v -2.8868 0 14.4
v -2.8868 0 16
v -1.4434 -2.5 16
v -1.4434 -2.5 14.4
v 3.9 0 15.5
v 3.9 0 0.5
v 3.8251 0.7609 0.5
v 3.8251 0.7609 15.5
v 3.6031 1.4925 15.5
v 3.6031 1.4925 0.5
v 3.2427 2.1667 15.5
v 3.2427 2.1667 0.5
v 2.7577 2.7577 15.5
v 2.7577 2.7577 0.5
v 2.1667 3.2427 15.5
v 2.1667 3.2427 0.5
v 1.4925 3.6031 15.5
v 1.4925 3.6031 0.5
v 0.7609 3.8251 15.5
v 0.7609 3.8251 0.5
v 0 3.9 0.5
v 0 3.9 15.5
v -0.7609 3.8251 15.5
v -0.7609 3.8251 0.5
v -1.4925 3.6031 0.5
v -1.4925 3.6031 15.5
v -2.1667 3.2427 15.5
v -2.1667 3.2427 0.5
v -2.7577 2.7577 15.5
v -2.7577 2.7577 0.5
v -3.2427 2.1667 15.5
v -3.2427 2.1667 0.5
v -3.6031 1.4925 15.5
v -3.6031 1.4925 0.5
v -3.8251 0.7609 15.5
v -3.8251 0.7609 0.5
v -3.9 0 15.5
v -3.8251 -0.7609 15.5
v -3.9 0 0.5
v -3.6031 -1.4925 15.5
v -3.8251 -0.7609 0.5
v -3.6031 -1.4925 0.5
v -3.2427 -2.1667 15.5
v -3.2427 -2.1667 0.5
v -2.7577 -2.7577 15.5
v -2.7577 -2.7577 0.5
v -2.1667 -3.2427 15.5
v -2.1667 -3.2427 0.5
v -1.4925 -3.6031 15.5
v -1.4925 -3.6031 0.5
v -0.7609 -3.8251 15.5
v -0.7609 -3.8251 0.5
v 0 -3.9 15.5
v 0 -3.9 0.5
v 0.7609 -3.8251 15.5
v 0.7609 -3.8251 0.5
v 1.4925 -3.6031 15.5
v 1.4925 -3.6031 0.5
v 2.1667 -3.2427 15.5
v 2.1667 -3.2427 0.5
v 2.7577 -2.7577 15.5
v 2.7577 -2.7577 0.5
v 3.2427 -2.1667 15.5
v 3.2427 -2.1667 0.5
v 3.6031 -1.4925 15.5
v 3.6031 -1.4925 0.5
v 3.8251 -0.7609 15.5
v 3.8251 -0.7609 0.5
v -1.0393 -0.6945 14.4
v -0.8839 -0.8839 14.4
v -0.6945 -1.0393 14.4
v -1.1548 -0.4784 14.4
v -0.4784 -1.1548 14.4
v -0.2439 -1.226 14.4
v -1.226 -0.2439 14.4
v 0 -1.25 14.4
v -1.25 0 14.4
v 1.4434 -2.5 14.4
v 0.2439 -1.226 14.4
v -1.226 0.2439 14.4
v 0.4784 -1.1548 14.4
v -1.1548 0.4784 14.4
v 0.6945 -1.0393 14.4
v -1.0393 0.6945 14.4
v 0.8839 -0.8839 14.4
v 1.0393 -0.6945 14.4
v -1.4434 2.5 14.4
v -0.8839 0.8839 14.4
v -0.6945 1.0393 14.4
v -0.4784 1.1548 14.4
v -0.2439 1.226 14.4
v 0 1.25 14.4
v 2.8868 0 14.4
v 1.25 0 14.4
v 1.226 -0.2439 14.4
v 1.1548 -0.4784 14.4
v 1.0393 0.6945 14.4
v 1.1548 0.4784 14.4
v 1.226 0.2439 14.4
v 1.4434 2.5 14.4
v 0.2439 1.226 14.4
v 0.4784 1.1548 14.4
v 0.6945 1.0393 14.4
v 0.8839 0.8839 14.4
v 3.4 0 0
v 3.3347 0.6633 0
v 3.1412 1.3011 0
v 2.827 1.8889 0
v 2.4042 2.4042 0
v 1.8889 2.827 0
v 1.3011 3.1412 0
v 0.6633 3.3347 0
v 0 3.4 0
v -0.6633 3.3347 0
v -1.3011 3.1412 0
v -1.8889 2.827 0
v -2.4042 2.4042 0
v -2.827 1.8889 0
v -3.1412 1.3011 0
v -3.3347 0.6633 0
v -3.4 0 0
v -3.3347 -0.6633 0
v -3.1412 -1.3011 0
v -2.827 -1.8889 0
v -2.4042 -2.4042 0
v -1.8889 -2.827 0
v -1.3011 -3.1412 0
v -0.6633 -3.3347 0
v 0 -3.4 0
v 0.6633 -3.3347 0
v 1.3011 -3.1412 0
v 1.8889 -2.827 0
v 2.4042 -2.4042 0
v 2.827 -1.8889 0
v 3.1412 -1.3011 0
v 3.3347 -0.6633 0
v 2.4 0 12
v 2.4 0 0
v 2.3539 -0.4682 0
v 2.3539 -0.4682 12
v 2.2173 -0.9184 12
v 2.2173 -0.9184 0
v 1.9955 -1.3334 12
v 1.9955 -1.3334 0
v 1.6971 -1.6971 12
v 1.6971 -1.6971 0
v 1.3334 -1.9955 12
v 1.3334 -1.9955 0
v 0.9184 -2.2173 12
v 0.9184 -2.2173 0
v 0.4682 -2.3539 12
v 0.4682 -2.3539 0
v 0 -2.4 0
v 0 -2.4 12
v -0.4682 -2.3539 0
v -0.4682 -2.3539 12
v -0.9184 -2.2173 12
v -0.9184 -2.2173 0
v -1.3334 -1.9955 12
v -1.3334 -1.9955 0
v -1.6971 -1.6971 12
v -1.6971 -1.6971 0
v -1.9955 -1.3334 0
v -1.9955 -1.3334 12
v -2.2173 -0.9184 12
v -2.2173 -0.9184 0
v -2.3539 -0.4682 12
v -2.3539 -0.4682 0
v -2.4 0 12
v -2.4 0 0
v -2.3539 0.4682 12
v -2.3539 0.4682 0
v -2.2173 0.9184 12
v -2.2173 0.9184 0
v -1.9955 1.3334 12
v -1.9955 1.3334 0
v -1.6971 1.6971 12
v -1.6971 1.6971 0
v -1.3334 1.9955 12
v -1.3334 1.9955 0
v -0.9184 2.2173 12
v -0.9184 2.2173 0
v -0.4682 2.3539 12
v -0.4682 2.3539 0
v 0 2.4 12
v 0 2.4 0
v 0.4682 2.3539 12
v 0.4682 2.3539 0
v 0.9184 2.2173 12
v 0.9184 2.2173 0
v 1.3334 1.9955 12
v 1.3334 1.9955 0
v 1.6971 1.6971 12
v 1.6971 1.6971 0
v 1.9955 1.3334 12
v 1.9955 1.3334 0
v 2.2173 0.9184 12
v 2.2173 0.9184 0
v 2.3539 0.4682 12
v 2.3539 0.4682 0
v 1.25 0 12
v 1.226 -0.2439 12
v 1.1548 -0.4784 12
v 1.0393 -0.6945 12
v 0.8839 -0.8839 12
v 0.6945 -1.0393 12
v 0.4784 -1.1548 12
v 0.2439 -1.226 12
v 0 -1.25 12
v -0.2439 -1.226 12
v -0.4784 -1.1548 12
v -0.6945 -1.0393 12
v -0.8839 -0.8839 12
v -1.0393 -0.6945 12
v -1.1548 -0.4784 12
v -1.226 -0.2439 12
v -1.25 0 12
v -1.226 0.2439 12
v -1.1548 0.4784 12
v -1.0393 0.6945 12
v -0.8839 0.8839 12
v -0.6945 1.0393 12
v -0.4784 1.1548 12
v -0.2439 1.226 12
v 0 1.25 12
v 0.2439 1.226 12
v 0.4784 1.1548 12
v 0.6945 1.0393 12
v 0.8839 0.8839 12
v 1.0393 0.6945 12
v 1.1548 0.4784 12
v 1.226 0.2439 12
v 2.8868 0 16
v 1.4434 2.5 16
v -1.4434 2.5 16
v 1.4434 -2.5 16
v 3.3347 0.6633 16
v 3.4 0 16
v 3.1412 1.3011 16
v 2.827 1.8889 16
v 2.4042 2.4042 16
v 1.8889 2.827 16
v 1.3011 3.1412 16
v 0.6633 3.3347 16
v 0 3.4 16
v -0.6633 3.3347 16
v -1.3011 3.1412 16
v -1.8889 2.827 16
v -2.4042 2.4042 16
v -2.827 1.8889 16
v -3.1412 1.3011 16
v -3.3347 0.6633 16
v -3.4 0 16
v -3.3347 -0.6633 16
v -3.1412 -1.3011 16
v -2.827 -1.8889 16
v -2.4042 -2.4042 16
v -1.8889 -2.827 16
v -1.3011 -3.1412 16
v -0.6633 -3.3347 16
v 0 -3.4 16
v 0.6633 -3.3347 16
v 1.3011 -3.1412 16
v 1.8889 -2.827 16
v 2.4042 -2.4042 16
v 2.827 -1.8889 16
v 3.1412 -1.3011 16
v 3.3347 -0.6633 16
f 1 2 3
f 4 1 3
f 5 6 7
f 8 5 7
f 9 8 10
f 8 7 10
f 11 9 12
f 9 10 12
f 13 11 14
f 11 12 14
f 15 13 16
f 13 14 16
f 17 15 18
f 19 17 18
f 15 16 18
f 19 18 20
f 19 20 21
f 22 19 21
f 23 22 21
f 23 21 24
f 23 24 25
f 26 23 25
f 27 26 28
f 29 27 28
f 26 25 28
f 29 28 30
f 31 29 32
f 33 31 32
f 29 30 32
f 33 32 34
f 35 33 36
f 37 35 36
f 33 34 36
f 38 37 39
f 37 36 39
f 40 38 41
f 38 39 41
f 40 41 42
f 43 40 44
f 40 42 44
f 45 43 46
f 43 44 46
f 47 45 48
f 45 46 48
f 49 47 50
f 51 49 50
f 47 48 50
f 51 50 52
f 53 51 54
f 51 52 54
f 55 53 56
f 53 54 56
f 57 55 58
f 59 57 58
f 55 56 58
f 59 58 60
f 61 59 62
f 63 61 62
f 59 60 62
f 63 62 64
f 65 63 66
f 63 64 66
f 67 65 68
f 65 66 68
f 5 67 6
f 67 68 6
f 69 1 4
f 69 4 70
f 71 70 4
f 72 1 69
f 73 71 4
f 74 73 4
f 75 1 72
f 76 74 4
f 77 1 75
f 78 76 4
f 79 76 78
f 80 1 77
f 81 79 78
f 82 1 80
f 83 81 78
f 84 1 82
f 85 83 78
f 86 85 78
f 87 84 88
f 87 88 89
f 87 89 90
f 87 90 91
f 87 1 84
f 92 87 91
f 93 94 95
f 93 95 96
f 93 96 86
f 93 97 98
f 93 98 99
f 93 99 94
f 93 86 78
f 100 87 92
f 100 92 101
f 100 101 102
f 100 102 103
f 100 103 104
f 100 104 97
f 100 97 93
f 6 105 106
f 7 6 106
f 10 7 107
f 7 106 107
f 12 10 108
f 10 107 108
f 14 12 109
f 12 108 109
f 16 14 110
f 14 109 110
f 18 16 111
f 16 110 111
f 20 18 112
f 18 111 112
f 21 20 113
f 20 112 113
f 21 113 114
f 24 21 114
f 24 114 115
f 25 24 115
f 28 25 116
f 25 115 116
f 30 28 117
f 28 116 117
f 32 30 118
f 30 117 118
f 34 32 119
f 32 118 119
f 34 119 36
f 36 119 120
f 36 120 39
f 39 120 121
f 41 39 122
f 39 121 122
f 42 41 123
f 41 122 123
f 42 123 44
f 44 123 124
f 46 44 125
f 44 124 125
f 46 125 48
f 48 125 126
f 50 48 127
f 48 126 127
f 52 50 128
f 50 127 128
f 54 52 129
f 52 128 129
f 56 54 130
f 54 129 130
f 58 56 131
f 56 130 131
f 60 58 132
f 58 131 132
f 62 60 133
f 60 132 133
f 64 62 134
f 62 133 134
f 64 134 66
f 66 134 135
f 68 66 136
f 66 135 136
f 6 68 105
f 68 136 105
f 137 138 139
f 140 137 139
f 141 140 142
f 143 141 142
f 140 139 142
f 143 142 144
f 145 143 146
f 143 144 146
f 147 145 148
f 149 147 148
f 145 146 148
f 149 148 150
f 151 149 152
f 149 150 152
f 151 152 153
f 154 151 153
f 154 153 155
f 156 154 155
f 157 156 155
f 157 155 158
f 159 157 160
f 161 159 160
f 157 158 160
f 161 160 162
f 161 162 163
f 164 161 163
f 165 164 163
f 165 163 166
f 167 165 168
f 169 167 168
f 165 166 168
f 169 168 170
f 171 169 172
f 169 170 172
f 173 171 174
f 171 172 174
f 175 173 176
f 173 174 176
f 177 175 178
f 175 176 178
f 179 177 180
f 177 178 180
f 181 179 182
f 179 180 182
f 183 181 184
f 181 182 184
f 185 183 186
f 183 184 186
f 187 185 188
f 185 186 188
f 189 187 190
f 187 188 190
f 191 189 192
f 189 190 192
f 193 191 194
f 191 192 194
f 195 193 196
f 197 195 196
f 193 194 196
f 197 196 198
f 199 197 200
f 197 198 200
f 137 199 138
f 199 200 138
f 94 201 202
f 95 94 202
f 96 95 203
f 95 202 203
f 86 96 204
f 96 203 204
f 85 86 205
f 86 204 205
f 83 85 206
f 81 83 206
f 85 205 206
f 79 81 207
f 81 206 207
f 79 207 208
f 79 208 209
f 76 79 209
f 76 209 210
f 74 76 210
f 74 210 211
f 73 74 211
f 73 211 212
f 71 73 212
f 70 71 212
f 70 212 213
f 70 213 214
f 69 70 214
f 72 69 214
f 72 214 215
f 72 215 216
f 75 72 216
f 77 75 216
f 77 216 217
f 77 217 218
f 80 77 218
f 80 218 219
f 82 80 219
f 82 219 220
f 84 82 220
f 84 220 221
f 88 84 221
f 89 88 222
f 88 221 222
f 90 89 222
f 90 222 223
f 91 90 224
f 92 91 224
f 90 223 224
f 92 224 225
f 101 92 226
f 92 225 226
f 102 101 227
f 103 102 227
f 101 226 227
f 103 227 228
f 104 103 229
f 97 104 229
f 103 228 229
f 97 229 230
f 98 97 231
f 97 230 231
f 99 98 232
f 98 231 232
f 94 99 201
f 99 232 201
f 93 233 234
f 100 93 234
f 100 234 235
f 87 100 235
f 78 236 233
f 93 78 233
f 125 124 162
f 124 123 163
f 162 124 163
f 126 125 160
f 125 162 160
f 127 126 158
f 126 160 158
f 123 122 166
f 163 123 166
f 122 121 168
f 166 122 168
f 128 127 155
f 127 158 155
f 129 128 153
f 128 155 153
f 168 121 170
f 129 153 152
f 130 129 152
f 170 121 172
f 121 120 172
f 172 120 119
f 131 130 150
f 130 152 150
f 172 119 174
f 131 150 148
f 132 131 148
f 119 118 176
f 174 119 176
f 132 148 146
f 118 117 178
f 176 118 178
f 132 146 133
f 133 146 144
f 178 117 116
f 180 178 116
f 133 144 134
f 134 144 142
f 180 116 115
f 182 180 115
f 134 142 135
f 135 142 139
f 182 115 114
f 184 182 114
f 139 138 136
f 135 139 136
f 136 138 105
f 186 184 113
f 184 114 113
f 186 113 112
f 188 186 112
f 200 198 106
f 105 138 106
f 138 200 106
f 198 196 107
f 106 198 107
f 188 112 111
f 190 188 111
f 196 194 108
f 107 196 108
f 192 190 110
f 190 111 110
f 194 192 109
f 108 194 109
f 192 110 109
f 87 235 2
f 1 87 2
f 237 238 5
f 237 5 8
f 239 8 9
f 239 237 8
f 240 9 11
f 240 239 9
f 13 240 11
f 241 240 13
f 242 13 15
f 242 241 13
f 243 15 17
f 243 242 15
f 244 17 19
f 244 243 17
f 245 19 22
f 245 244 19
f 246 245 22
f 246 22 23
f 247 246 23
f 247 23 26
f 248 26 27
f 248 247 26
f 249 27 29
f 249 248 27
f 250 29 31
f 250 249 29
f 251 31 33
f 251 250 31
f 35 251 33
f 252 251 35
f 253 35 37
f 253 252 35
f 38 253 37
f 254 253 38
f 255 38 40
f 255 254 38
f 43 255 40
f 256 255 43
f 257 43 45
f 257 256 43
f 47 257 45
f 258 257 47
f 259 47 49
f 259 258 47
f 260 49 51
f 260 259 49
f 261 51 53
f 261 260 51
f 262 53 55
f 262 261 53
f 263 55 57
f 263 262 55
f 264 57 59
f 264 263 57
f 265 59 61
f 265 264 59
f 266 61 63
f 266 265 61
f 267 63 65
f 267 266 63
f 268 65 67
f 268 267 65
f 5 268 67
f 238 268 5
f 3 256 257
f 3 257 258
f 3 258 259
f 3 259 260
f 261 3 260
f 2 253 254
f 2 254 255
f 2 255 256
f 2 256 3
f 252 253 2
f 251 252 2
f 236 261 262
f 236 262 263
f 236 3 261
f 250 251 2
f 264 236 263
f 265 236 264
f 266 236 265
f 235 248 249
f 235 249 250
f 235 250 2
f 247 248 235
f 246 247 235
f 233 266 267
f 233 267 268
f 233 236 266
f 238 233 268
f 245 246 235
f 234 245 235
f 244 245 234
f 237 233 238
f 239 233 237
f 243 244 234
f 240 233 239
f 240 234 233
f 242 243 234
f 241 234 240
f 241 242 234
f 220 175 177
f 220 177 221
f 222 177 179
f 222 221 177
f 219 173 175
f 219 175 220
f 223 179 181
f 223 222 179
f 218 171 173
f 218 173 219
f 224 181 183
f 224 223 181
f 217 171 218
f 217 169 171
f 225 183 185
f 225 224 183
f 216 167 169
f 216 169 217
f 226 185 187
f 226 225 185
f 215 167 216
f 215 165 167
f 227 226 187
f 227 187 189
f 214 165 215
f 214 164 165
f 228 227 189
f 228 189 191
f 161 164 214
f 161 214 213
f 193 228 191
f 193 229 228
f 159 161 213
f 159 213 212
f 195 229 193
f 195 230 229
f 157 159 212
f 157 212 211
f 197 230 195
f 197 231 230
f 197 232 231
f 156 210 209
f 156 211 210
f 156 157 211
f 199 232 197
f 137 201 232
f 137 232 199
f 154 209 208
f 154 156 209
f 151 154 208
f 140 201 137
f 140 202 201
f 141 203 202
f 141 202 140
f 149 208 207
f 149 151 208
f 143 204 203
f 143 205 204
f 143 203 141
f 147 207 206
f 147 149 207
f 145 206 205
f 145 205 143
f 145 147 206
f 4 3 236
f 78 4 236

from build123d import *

# Parameters (mm, degrees)
F0_R     = 3.9
F1_DEPTH = 16
F2_R     = 2.4
F3_DEPTH = 12
F4_R     = 1.25
F5_DEPTH = 4.001
F6_SIZE  = 0.5
F7_SIZE  = 0.5
F9_DEPTH = 1.6


with BuildPart() as f1:
    # F0 (on Top) → F1 (new body)
    with BuildSketch(Plane.XY):
        Circle(F0_R)
    extrude(amount=F1_DEPTH)

    # F2 (on face) → F3 (cut)
    with BuildSketch(Plane(origin=(0, 0, 0), x_dir=(1, 0, 0), z_dir=(0, 0, -1))):
        Circle(F2_R)
    extrude(amount=-F3_DEPTH, mode=Mode.SUBTRACT)

    # F4 (on face) → F5 (cut, through all)
    with BuildSketch(Plane(origin=(0, 0, 12), x_dir=(1, 0, 0), z_dir=(0, 0, -1))):
        Circle(F4_R)
    extrude(amount=-F5_DEPTH, mode=Mode.SUBTRACT)

    # F6
    f6_edges = [f1.edges().sort_by_distance(p)[0] for p in [
        (-3.9, 0, 16),
    ]]
    chamfer(f6_edges, length=F6_SIZE)

    # F7
    f7_edges = [f1.edges().sort_by_distance(p)[0] for p in [
        (-3.9, 0, 0),
    ]]
    chamfer(f7_edges, length=F7_SIZE)

    # F8 (on face) → F9 (cut)
    with BuildSketch(Plane.XY.offset(16)):
        Polygon((-2.886751, 0), (-1.443376, -2.5), (1.443376, -2.5), (2.886751, 0), (1.443376, 2.5), (-1.443376, 2.5), align=None)
    extrude(amount=-F9_DEPTH, mode=Mode.SUBTRACT)


solid = f1.part
